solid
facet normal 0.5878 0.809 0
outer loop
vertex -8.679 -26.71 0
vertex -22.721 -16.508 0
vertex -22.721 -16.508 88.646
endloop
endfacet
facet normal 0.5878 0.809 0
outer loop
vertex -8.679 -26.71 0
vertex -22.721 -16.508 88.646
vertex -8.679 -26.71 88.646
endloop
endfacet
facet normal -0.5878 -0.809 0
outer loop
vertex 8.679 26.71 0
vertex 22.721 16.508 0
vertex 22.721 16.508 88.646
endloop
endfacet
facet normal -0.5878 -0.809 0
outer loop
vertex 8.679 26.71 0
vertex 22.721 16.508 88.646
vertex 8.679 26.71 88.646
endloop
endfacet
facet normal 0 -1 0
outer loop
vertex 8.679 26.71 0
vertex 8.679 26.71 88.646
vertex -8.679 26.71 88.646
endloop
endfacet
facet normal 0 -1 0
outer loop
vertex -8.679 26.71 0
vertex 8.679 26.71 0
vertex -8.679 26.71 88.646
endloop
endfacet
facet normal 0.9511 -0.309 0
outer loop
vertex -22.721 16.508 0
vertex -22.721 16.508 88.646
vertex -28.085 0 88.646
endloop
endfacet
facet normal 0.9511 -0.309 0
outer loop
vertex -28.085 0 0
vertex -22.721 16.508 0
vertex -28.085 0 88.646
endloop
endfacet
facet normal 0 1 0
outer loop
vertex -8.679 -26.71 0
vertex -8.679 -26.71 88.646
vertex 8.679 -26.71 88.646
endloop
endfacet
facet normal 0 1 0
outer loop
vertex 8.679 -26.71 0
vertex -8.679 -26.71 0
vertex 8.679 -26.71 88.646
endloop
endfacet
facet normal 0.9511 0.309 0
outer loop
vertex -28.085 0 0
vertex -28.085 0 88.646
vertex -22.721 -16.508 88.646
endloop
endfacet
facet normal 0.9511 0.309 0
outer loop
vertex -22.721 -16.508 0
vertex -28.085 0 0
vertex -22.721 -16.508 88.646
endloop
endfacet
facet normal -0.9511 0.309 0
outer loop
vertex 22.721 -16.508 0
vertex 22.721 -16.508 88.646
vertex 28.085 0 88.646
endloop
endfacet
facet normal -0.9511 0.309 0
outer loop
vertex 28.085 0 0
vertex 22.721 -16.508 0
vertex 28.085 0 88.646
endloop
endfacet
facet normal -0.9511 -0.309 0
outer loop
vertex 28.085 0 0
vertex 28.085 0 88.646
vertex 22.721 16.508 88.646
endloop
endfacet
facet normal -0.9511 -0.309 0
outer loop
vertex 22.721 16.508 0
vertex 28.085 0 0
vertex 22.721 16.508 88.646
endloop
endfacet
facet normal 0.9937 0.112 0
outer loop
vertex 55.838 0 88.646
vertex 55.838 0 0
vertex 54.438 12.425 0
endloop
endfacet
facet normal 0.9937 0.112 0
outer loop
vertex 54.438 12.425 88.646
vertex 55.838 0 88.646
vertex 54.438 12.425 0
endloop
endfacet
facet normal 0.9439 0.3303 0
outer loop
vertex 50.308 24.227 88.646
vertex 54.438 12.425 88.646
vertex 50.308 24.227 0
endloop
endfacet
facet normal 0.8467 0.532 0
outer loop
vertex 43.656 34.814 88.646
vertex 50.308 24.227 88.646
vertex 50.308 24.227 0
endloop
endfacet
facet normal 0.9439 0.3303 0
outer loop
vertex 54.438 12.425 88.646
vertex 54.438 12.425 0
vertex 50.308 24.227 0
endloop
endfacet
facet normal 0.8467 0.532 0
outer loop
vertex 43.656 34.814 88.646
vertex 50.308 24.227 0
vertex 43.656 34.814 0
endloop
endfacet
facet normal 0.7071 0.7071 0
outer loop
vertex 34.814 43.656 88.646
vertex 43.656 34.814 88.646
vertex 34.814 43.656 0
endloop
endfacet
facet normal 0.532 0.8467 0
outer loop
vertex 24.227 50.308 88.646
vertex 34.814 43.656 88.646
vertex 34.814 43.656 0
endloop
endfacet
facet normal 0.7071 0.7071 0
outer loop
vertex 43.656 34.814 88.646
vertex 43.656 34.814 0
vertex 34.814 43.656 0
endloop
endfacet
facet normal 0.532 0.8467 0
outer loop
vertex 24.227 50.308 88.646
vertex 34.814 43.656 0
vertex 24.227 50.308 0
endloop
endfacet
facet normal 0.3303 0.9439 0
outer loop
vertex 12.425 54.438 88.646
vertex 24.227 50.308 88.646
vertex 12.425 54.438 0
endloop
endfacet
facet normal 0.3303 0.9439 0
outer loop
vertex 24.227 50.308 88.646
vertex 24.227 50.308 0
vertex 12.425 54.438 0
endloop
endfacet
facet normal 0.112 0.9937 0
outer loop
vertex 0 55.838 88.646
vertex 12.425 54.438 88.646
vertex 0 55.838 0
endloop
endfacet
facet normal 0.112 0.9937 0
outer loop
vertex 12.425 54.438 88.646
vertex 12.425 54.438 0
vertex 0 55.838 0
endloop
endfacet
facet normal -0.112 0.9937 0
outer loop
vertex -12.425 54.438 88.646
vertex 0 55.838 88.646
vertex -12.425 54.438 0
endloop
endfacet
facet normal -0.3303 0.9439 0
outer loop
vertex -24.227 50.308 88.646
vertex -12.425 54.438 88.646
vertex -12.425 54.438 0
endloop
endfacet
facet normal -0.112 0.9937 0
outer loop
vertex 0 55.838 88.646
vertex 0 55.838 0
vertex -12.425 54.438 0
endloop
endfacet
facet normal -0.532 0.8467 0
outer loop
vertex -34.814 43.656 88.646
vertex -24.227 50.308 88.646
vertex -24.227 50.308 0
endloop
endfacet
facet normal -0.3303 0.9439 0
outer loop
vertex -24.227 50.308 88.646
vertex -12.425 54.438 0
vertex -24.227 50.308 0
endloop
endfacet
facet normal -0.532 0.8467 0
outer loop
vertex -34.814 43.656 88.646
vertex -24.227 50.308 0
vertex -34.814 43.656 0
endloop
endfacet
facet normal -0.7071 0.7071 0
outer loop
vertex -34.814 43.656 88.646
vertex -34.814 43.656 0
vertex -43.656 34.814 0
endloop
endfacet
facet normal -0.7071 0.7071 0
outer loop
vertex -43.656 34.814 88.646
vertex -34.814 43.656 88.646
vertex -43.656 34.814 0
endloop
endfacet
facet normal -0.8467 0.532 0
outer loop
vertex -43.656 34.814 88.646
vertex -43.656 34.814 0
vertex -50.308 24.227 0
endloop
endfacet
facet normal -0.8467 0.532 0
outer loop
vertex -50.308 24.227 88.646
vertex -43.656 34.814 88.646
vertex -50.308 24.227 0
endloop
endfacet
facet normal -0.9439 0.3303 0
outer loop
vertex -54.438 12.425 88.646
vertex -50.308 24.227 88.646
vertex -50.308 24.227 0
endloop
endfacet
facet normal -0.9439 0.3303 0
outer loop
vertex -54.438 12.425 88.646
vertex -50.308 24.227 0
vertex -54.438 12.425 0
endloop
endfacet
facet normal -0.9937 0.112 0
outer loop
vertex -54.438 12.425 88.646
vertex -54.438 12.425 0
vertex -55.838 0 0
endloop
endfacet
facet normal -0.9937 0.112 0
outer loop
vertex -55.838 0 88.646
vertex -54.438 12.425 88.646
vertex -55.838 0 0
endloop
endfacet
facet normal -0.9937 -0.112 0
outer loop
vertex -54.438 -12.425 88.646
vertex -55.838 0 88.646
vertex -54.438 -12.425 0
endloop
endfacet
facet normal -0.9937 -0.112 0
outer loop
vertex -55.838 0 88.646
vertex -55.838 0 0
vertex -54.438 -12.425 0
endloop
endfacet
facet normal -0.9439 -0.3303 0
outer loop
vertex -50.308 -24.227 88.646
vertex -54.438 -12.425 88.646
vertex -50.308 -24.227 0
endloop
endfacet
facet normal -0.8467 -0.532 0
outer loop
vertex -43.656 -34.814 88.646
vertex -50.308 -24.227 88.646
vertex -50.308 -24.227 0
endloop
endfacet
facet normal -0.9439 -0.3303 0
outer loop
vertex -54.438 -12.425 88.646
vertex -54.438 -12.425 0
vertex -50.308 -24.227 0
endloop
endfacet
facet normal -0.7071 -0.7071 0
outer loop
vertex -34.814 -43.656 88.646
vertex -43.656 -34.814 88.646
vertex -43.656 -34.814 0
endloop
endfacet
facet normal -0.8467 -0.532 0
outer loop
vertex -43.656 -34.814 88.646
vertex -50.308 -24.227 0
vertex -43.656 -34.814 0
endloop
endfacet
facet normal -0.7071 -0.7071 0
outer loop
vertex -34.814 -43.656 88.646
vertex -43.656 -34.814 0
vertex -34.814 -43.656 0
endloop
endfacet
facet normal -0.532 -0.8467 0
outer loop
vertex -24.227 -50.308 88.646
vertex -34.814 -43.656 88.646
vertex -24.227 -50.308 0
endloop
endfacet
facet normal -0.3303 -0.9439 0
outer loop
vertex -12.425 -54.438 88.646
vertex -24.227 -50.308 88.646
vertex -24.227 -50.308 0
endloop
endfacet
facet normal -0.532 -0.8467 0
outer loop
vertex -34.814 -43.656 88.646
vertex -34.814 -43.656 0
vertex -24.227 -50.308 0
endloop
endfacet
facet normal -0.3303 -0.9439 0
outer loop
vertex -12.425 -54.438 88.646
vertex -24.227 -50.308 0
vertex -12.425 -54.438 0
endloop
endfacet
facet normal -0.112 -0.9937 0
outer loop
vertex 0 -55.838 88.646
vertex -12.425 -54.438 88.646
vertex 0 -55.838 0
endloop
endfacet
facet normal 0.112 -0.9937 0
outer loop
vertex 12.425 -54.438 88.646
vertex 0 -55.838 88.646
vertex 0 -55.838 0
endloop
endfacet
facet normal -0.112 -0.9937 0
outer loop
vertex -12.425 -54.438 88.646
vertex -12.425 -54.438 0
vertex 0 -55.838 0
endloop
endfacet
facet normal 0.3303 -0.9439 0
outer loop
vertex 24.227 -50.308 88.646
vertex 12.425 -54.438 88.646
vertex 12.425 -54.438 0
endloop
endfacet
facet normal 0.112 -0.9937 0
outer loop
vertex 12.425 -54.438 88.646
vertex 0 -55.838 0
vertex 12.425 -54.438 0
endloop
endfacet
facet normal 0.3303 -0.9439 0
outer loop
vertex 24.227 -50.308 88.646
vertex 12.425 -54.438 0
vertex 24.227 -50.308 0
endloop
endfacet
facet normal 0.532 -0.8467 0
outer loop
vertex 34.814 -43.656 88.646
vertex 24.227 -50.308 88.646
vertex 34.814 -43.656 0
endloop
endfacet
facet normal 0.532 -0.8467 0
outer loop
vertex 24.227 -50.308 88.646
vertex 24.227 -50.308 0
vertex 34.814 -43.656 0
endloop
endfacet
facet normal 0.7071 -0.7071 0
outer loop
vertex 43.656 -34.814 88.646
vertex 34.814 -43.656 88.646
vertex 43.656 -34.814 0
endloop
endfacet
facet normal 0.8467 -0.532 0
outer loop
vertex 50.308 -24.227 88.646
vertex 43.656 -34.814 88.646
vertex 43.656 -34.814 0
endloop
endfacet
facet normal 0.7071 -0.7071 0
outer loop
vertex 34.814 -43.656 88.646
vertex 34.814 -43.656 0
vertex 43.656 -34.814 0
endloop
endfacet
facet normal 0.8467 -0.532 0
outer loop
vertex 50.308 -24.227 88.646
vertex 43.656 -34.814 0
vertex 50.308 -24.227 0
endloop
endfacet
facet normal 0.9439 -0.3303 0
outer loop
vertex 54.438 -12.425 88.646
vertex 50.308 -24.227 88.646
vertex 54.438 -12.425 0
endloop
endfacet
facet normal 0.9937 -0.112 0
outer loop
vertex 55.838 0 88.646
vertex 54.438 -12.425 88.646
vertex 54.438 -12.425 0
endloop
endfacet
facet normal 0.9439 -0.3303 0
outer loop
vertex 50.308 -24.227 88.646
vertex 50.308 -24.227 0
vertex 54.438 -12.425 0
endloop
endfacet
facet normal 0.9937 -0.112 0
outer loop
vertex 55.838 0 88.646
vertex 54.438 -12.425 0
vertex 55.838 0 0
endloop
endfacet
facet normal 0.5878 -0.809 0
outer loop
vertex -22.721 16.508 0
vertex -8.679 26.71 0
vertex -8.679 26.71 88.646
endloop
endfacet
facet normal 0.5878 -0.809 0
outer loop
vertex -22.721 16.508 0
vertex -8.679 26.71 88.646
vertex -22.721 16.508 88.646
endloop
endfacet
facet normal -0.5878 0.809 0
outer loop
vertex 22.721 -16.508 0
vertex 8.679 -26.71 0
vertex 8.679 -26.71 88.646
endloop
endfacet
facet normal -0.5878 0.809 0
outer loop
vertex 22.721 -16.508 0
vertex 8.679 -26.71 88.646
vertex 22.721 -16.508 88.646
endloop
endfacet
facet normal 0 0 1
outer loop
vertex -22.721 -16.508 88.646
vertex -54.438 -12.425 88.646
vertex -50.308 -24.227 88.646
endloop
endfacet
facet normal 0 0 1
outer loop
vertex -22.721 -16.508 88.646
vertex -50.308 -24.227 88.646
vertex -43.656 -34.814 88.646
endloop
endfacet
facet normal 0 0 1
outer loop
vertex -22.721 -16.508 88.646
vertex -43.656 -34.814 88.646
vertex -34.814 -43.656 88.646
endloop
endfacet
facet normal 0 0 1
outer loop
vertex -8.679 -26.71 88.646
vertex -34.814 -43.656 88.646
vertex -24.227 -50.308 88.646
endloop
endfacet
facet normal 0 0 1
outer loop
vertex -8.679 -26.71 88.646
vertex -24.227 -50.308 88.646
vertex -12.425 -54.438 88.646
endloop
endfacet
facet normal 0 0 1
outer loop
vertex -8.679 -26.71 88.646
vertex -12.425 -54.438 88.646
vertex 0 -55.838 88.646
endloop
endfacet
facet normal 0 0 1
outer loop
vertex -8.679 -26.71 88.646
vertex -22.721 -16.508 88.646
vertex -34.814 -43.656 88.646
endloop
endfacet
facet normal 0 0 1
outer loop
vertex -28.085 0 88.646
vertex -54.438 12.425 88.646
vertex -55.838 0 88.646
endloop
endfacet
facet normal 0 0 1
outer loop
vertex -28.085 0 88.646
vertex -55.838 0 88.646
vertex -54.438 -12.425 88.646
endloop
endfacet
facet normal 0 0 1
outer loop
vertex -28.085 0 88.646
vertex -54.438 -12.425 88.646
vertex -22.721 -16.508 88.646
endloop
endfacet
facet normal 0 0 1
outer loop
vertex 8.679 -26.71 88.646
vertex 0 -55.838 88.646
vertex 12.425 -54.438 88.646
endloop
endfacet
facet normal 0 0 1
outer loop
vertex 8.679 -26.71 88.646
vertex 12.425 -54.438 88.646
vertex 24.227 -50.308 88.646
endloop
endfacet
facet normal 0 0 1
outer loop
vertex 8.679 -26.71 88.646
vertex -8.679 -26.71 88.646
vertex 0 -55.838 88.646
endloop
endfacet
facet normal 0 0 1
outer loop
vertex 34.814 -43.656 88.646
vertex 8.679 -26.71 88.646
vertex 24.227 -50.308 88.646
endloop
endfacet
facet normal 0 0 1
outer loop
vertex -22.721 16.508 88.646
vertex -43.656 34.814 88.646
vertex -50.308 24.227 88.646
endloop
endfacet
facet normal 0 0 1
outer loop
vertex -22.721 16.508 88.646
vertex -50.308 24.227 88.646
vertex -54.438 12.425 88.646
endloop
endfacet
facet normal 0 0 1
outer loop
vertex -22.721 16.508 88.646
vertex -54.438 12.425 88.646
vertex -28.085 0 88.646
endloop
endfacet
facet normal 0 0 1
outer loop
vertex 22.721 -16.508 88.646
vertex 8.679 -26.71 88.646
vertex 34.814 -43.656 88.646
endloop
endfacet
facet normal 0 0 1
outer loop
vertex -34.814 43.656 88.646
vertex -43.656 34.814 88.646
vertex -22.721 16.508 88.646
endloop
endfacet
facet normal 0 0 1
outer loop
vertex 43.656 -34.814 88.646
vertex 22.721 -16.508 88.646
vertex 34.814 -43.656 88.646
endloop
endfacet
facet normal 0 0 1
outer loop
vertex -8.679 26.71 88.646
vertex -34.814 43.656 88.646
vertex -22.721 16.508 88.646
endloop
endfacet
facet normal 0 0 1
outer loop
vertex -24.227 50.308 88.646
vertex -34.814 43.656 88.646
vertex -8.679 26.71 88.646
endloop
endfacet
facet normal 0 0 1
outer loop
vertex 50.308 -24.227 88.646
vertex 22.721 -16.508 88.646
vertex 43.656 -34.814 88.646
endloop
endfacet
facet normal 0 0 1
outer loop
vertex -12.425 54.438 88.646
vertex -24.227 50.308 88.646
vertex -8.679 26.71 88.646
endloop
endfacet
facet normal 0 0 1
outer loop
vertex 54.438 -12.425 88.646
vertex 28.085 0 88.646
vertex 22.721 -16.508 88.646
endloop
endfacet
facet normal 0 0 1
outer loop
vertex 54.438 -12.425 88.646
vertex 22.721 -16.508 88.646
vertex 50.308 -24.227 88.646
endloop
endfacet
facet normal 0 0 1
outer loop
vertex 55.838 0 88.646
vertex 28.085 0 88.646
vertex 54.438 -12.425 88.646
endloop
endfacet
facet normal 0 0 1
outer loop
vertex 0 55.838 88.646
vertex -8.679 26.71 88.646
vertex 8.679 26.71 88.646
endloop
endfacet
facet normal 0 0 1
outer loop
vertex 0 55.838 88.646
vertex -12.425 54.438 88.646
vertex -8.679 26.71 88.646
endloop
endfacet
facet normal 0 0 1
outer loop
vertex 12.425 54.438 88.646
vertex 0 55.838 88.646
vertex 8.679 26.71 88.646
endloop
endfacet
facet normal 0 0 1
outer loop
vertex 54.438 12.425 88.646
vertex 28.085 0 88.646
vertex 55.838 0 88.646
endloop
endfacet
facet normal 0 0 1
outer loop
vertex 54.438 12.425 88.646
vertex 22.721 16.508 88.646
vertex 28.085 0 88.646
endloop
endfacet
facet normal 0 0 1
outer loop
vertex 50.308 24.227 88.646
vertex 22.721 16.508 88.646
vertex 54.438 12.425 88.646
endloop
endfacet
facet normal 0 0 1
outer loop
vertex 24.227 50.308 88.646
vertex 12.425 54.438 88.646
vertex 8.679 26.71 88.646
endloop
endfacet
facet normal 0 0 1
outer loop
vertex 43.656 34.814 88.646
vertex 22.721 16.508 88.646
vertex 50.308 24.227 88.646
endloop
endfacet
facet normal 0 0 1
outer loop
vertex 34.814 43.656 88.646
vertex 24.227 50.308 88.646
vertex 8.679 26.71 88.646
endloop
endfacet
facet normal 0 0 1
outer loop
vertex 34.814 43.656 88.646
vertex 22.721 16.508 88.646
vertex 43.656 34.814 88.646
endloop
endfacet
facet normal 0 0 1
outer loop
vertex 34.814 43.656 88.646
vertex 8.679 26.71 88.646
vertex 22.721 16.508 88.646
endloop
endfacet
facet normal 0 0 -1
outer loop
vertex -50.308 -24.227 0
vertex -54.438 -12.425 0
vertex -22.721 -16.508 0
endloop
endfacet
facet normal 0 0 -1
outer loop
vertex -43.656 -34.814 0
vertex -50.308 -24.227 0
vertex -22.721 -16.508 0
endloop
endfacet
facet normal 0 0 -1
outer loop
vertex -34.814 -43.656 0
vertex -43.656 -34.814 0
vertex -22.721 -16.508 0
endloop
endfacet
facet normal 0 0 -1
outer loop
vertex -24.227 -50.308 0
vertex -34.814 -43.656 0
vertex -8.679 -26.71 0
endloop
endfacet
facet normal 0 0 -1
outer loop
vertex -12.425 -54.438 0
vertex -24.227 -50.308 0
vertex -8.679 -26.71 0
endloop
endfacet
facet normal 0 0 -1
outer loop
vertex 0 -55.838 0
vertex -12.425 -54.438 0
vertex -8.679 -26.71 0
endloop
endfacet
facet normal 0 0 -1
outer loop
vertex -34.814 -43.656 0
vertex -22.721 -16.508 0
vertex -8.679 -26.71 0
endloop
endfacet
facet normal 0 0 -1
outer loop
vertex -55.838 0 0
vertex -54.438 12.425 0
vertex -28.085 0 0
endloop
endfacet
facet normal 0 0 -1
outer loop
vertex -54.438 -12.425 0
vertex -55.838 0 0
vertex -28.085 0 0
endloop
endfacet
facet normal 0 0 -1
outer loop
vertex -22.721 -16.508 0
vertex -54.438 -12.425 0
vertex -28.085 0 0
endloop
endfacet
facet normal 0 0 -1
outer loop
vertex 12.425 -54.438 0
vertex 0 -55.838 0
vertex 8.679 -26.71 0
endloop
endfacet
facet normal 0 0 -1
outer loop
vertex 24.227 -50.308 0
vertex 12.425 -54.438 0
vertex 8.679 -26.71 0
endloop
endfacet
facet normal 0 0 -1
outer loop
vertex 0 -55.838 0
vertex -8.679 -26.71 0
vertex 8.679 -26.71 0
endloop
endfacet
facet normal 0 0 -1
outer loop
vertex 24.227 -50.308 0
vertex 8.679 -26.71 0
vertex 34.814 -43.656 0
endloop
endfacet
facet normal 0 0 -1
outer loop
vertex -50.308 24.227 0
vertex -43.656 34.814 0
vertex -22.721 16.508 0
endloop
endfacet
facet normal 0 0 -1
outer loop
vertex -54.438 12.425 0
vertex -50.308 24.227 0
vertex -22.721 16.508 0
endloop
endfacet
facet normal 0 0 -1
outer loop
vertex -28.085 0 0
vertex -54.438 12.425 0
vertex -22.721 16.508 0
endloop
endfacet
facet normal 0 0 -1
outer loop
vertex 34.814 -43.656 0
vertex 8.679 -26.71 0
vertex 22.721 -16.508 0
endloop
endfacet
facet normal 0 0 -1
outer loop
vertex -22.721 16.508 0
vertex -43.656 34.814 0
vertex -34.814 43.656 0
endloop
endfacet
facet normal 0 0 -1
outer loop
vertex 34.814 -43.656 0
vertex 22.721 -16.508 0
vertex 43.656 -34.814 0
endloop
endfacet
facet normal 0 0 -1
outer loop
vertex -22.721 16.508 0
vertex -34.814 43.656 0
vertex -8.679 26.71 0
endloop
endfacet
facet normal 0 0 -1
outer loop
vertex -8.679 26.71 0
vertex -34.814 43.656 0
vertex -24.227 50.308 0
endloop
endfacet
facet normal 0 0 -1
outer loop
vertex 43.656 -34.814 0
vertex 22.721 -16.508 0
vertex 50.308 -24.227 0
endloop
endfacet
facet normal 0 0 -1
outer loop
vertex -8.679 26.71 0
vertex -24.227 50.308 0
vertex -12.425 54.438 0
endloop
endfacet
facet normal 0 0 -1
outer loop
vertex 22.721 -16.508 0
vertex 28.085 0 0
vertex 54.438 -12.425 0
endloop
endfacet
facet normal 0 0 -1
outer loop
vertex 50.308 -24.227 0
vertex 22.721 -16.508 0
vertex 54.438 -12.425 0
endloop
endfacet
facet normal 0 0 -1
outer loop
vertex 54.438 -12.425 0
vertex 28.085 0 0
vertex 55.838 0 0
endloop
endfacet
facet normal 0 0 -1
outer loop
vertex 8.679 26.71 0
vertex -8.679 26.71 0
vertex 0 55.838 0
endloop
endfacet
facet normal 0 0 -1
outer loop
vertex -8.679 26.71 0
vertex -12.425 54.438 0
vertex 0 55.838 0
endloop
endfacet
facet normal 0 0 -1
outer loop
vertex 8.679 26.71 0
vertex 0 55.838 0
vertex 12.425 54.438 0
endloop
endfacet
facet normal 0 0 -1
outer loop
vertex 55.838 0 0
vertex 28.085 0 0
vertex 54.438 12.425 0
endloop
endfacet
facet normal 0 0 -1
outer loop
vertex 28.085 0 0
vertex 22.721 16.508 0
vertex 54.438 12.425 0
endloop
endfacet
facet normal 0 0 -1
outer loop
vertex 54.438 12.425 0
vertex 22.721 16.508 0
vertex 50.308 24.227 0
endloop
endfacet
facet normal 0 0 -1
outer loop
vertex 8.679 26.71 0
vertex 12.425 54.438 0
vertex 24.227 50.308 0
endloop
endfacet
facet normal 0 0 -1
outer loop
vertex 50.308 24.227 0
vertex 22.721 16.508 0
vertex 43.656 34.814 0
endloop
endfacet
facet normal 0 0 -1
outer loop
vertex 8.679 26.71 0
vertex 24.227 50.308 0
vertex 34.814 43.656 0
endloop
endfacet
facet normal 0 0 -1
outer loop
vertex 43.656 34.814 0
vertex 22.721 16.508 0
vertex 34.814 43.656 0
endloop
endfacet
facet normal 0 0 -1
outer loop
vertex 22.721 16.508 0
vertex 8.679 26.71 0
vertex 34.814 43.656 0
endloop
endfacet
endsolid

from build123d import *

# Parameters (mm, degrees)
F0_R     = 55.837677
F1_DEPTH = 88.646
F3_DEPTH = 88.647


with BuildPart() as f1:
    # F0 (on Top) → F1 (new body)
    with BuildSketch(Plane.XY):
        Circle(F0_R)
    extrude(amount=F1_DEPTH)

    # F2 (on Top) → F3 (cut, through all)
    with BuildSketch(Plane.XY):
        Polygon((8.678742, 26.710423), (-8.678742, 26.710423), (-22.721243, 16.507949), (-28.085, 0), (-22.721243, -16.507949), (-8.678742, -26.710423), (8.678742, -26.710423), (22.721243, -16.507949), (28.085, 0), (22.721243, 16.507949), align=None)
    extrude(amount=F3_DEPTH, mode=Mode.SUBTRACT)


solid = f1.part
